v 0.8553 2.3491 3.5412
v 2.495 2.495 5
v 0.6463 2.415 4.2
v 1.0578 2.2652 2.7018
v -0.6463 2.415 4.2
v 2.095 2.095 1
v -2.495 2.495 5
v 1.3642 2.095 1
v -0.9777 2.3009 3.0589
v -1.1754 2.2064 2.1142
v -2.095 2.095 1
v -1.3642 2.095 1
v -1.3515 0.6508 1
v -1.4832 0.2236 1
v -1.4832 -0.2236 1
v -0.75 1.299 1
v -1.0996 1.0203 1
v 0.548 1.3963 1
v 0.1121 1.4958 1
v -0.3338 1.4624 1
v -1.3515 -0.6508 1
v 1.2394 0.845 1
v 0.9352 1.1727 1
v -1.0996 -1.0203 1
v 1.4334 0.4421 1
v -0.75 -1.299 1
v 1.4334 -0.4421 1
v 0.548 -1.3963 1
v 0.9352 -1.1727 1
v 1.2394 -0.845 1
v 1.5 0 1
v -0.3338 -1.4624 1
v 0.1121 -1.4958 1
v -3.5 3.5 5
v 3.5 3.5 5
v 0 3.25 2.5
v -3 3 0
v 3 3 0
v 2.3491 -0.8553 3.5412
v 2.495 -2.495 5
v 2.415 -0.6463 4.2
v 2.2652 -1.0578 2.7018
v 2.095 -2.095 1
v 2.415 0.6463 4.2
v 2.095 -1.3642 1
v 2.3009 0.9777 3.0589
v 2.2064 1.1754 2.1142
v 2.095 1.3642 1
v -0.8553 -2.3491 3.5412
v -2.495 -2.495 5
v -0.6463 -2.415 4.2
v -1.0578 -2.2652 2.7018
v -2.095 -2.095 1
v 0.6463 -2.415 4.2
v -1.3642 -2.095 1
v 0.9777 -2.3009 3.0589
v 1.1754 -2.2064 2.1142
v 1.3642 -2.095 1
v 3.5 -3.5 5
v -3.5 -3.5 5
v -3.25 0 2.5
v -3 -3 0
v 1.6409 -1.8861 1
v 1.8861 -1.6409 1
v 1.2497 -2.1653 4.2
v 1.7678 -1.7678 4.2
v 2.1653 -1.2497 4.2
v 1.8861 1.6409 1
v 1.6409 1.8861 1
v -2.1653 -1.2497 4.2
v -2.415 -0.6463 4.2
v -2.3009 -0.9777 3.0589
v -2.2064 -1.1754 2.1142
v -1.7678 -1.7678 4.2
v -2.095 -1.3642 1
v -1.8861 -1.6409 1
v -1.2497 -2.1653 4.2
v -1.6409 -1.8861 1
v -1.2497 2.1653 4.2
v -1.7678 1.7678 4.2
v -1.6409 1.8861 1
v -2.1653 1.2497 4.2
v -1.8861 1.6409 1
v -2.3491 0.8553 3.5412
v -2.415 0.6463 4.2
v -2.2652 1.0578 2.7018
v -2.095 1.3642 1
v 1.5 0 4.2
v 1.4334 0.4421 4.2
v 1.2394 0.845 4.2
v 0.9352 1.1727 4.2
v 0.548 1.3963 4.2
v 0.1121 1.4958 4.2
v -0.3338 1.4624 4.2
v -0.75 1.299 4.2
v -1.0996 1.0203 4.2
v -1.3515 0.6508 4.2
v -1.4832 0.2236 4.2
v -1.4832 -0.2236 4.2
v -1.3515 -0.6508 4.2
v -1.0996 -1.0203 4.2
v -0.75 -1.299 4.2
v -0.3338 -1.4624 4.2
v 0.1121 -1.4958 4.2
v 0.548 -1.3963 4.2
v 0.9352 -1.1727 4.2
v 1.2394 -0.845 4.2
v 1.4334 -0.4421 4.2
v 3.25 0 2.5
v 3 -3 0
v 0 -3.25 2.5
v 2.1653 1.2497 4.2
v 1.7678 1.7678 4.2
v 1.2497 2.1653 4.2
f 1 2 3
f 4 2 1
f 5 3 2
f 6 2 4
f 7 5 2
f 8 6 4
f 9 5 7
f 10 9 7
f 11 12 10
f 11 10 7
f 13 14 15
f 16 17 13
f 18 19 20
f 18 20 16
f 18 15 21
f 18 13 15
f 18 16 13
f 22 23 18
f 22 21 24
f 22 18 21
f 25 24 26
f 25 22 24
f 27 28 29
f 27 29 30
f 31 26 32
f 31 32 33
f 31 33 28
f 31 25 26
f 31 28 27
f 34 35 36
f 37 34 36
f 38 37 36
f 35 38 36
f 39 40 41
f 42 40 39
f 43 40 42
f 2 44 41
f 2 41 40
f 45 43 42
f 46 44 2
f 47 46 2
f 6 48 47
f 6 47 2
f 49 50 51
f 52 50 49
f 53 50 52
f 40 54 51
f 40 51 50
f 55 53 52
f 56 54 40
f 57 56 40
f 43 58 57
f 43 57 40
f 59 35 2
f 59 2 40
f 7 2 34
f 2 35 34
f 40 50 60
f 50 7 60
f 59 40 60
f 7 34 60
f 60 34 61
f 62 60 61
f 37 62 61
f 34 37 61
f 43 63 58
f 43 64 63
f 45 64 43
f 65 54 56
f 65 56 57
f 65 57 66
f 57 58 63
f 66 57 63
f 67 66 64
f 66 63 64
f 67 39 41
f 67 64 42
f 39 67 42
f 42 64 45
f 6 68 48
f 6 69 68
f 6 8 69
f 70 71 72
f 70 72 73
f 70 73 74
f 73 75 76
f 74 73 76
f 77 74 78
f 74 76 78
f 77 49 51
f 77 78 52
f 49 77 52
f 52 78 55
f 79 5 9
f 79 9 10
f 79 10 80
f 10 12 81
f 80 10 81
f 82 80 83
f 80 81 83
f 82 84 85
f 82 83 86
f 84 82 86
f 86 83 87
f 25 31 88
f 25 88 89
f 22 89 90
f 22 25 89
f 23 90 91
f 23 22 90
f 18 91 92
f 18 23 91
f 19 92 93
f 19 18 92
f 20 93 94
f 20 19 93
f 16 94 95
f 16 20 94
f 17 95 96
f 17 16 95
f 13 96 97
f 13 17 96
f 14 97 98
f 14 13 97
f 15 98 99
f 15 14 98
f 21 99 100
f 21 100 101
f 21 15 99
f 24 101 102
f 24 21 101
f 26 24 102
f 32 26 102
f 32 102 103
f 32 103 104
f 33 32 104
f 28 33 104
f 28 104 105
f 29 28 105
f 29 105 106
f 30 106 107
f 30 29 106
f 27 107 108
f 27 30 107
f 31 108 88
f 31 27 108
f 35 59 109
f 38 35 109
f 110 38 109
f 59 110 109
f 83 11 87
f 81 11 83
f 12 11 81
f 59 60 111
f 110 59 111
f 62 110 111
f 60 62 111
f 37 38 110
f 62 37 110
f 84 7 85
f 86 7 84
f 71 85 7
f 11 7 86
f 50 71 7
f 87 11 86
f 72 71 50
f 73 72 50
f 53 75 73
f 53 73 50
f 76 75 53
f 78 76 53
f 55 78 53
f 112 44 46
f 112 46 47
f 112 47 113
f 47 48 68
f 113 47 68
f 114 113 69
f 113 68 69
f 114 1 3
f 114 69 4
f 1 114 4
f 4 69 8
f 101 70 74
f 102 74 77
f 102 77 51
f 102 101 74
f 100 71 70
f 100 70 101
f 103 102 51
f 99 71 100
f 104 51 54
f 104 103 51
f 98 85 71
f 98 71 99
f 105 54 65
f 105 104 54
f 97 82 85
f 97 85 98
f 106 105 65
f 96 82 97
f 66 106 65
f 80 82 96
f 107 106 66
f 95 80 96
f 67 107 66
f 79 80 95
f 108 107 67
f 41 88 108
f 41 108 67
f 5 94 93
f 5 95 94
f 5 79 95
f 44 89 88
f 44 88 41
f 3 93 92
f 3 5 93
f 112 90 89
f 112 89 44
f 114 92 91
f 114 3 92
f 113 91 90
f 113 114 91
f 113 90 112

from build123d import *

# Parameters (mm, degrees)
COQUE1_T           = -1
ESQUISSE3_R        = 2.5
ESQUISSE3_R_2      = 1.5
BOSS_EXTRU_1_DEPTH = 3.2


with BuildPart() as part:
    # Esquisse2 → Lissage1 section 0
    with BuildSketch(Plane.XY.offset(5)):
        with BuildLine():
            Line((3.5, 3.5), (-3.5, 3.5))
            Line((-3.5, 3.5), (-3.5, -3.5))
            Line((-3.5, -3.5), (3.5, -3.5))
            Line((3.5, -3.5), (3.5, 3.5))
        make_face()
    # Esquisse1 → Lissage1 section 1
    with BuildSketch(Plane.XY):
        with BuildLine():
            Line((-3, 3), (3, 3))
            Line((3, 3), (3, -3))
            Line((3, -3), (-3, -3))
            Line((-3, -3), (-3, 3))
        make_face()
    loft()

    # Coque1
    coque1_openings = [part.faces().sort_by_distance(p)[0] for p in [
        (0, 0, 5),
    ]]
    offset(amount=COQUE1_T, openings=coque1_openings, kind=Kind.INTERSECTION)

    # Esquisse3 → Boss.-Extru.1 (add)
    with BuildSketch(Plane.XY.offset(1)):
        Circle(ESQUISSE3_R)
        Circle(ESQUISSE3_R_2, mode=Mode.SUBTRACT)
    extrude(amount=BOSS_EXTRU_1_DEPTH)


solid = part.part
